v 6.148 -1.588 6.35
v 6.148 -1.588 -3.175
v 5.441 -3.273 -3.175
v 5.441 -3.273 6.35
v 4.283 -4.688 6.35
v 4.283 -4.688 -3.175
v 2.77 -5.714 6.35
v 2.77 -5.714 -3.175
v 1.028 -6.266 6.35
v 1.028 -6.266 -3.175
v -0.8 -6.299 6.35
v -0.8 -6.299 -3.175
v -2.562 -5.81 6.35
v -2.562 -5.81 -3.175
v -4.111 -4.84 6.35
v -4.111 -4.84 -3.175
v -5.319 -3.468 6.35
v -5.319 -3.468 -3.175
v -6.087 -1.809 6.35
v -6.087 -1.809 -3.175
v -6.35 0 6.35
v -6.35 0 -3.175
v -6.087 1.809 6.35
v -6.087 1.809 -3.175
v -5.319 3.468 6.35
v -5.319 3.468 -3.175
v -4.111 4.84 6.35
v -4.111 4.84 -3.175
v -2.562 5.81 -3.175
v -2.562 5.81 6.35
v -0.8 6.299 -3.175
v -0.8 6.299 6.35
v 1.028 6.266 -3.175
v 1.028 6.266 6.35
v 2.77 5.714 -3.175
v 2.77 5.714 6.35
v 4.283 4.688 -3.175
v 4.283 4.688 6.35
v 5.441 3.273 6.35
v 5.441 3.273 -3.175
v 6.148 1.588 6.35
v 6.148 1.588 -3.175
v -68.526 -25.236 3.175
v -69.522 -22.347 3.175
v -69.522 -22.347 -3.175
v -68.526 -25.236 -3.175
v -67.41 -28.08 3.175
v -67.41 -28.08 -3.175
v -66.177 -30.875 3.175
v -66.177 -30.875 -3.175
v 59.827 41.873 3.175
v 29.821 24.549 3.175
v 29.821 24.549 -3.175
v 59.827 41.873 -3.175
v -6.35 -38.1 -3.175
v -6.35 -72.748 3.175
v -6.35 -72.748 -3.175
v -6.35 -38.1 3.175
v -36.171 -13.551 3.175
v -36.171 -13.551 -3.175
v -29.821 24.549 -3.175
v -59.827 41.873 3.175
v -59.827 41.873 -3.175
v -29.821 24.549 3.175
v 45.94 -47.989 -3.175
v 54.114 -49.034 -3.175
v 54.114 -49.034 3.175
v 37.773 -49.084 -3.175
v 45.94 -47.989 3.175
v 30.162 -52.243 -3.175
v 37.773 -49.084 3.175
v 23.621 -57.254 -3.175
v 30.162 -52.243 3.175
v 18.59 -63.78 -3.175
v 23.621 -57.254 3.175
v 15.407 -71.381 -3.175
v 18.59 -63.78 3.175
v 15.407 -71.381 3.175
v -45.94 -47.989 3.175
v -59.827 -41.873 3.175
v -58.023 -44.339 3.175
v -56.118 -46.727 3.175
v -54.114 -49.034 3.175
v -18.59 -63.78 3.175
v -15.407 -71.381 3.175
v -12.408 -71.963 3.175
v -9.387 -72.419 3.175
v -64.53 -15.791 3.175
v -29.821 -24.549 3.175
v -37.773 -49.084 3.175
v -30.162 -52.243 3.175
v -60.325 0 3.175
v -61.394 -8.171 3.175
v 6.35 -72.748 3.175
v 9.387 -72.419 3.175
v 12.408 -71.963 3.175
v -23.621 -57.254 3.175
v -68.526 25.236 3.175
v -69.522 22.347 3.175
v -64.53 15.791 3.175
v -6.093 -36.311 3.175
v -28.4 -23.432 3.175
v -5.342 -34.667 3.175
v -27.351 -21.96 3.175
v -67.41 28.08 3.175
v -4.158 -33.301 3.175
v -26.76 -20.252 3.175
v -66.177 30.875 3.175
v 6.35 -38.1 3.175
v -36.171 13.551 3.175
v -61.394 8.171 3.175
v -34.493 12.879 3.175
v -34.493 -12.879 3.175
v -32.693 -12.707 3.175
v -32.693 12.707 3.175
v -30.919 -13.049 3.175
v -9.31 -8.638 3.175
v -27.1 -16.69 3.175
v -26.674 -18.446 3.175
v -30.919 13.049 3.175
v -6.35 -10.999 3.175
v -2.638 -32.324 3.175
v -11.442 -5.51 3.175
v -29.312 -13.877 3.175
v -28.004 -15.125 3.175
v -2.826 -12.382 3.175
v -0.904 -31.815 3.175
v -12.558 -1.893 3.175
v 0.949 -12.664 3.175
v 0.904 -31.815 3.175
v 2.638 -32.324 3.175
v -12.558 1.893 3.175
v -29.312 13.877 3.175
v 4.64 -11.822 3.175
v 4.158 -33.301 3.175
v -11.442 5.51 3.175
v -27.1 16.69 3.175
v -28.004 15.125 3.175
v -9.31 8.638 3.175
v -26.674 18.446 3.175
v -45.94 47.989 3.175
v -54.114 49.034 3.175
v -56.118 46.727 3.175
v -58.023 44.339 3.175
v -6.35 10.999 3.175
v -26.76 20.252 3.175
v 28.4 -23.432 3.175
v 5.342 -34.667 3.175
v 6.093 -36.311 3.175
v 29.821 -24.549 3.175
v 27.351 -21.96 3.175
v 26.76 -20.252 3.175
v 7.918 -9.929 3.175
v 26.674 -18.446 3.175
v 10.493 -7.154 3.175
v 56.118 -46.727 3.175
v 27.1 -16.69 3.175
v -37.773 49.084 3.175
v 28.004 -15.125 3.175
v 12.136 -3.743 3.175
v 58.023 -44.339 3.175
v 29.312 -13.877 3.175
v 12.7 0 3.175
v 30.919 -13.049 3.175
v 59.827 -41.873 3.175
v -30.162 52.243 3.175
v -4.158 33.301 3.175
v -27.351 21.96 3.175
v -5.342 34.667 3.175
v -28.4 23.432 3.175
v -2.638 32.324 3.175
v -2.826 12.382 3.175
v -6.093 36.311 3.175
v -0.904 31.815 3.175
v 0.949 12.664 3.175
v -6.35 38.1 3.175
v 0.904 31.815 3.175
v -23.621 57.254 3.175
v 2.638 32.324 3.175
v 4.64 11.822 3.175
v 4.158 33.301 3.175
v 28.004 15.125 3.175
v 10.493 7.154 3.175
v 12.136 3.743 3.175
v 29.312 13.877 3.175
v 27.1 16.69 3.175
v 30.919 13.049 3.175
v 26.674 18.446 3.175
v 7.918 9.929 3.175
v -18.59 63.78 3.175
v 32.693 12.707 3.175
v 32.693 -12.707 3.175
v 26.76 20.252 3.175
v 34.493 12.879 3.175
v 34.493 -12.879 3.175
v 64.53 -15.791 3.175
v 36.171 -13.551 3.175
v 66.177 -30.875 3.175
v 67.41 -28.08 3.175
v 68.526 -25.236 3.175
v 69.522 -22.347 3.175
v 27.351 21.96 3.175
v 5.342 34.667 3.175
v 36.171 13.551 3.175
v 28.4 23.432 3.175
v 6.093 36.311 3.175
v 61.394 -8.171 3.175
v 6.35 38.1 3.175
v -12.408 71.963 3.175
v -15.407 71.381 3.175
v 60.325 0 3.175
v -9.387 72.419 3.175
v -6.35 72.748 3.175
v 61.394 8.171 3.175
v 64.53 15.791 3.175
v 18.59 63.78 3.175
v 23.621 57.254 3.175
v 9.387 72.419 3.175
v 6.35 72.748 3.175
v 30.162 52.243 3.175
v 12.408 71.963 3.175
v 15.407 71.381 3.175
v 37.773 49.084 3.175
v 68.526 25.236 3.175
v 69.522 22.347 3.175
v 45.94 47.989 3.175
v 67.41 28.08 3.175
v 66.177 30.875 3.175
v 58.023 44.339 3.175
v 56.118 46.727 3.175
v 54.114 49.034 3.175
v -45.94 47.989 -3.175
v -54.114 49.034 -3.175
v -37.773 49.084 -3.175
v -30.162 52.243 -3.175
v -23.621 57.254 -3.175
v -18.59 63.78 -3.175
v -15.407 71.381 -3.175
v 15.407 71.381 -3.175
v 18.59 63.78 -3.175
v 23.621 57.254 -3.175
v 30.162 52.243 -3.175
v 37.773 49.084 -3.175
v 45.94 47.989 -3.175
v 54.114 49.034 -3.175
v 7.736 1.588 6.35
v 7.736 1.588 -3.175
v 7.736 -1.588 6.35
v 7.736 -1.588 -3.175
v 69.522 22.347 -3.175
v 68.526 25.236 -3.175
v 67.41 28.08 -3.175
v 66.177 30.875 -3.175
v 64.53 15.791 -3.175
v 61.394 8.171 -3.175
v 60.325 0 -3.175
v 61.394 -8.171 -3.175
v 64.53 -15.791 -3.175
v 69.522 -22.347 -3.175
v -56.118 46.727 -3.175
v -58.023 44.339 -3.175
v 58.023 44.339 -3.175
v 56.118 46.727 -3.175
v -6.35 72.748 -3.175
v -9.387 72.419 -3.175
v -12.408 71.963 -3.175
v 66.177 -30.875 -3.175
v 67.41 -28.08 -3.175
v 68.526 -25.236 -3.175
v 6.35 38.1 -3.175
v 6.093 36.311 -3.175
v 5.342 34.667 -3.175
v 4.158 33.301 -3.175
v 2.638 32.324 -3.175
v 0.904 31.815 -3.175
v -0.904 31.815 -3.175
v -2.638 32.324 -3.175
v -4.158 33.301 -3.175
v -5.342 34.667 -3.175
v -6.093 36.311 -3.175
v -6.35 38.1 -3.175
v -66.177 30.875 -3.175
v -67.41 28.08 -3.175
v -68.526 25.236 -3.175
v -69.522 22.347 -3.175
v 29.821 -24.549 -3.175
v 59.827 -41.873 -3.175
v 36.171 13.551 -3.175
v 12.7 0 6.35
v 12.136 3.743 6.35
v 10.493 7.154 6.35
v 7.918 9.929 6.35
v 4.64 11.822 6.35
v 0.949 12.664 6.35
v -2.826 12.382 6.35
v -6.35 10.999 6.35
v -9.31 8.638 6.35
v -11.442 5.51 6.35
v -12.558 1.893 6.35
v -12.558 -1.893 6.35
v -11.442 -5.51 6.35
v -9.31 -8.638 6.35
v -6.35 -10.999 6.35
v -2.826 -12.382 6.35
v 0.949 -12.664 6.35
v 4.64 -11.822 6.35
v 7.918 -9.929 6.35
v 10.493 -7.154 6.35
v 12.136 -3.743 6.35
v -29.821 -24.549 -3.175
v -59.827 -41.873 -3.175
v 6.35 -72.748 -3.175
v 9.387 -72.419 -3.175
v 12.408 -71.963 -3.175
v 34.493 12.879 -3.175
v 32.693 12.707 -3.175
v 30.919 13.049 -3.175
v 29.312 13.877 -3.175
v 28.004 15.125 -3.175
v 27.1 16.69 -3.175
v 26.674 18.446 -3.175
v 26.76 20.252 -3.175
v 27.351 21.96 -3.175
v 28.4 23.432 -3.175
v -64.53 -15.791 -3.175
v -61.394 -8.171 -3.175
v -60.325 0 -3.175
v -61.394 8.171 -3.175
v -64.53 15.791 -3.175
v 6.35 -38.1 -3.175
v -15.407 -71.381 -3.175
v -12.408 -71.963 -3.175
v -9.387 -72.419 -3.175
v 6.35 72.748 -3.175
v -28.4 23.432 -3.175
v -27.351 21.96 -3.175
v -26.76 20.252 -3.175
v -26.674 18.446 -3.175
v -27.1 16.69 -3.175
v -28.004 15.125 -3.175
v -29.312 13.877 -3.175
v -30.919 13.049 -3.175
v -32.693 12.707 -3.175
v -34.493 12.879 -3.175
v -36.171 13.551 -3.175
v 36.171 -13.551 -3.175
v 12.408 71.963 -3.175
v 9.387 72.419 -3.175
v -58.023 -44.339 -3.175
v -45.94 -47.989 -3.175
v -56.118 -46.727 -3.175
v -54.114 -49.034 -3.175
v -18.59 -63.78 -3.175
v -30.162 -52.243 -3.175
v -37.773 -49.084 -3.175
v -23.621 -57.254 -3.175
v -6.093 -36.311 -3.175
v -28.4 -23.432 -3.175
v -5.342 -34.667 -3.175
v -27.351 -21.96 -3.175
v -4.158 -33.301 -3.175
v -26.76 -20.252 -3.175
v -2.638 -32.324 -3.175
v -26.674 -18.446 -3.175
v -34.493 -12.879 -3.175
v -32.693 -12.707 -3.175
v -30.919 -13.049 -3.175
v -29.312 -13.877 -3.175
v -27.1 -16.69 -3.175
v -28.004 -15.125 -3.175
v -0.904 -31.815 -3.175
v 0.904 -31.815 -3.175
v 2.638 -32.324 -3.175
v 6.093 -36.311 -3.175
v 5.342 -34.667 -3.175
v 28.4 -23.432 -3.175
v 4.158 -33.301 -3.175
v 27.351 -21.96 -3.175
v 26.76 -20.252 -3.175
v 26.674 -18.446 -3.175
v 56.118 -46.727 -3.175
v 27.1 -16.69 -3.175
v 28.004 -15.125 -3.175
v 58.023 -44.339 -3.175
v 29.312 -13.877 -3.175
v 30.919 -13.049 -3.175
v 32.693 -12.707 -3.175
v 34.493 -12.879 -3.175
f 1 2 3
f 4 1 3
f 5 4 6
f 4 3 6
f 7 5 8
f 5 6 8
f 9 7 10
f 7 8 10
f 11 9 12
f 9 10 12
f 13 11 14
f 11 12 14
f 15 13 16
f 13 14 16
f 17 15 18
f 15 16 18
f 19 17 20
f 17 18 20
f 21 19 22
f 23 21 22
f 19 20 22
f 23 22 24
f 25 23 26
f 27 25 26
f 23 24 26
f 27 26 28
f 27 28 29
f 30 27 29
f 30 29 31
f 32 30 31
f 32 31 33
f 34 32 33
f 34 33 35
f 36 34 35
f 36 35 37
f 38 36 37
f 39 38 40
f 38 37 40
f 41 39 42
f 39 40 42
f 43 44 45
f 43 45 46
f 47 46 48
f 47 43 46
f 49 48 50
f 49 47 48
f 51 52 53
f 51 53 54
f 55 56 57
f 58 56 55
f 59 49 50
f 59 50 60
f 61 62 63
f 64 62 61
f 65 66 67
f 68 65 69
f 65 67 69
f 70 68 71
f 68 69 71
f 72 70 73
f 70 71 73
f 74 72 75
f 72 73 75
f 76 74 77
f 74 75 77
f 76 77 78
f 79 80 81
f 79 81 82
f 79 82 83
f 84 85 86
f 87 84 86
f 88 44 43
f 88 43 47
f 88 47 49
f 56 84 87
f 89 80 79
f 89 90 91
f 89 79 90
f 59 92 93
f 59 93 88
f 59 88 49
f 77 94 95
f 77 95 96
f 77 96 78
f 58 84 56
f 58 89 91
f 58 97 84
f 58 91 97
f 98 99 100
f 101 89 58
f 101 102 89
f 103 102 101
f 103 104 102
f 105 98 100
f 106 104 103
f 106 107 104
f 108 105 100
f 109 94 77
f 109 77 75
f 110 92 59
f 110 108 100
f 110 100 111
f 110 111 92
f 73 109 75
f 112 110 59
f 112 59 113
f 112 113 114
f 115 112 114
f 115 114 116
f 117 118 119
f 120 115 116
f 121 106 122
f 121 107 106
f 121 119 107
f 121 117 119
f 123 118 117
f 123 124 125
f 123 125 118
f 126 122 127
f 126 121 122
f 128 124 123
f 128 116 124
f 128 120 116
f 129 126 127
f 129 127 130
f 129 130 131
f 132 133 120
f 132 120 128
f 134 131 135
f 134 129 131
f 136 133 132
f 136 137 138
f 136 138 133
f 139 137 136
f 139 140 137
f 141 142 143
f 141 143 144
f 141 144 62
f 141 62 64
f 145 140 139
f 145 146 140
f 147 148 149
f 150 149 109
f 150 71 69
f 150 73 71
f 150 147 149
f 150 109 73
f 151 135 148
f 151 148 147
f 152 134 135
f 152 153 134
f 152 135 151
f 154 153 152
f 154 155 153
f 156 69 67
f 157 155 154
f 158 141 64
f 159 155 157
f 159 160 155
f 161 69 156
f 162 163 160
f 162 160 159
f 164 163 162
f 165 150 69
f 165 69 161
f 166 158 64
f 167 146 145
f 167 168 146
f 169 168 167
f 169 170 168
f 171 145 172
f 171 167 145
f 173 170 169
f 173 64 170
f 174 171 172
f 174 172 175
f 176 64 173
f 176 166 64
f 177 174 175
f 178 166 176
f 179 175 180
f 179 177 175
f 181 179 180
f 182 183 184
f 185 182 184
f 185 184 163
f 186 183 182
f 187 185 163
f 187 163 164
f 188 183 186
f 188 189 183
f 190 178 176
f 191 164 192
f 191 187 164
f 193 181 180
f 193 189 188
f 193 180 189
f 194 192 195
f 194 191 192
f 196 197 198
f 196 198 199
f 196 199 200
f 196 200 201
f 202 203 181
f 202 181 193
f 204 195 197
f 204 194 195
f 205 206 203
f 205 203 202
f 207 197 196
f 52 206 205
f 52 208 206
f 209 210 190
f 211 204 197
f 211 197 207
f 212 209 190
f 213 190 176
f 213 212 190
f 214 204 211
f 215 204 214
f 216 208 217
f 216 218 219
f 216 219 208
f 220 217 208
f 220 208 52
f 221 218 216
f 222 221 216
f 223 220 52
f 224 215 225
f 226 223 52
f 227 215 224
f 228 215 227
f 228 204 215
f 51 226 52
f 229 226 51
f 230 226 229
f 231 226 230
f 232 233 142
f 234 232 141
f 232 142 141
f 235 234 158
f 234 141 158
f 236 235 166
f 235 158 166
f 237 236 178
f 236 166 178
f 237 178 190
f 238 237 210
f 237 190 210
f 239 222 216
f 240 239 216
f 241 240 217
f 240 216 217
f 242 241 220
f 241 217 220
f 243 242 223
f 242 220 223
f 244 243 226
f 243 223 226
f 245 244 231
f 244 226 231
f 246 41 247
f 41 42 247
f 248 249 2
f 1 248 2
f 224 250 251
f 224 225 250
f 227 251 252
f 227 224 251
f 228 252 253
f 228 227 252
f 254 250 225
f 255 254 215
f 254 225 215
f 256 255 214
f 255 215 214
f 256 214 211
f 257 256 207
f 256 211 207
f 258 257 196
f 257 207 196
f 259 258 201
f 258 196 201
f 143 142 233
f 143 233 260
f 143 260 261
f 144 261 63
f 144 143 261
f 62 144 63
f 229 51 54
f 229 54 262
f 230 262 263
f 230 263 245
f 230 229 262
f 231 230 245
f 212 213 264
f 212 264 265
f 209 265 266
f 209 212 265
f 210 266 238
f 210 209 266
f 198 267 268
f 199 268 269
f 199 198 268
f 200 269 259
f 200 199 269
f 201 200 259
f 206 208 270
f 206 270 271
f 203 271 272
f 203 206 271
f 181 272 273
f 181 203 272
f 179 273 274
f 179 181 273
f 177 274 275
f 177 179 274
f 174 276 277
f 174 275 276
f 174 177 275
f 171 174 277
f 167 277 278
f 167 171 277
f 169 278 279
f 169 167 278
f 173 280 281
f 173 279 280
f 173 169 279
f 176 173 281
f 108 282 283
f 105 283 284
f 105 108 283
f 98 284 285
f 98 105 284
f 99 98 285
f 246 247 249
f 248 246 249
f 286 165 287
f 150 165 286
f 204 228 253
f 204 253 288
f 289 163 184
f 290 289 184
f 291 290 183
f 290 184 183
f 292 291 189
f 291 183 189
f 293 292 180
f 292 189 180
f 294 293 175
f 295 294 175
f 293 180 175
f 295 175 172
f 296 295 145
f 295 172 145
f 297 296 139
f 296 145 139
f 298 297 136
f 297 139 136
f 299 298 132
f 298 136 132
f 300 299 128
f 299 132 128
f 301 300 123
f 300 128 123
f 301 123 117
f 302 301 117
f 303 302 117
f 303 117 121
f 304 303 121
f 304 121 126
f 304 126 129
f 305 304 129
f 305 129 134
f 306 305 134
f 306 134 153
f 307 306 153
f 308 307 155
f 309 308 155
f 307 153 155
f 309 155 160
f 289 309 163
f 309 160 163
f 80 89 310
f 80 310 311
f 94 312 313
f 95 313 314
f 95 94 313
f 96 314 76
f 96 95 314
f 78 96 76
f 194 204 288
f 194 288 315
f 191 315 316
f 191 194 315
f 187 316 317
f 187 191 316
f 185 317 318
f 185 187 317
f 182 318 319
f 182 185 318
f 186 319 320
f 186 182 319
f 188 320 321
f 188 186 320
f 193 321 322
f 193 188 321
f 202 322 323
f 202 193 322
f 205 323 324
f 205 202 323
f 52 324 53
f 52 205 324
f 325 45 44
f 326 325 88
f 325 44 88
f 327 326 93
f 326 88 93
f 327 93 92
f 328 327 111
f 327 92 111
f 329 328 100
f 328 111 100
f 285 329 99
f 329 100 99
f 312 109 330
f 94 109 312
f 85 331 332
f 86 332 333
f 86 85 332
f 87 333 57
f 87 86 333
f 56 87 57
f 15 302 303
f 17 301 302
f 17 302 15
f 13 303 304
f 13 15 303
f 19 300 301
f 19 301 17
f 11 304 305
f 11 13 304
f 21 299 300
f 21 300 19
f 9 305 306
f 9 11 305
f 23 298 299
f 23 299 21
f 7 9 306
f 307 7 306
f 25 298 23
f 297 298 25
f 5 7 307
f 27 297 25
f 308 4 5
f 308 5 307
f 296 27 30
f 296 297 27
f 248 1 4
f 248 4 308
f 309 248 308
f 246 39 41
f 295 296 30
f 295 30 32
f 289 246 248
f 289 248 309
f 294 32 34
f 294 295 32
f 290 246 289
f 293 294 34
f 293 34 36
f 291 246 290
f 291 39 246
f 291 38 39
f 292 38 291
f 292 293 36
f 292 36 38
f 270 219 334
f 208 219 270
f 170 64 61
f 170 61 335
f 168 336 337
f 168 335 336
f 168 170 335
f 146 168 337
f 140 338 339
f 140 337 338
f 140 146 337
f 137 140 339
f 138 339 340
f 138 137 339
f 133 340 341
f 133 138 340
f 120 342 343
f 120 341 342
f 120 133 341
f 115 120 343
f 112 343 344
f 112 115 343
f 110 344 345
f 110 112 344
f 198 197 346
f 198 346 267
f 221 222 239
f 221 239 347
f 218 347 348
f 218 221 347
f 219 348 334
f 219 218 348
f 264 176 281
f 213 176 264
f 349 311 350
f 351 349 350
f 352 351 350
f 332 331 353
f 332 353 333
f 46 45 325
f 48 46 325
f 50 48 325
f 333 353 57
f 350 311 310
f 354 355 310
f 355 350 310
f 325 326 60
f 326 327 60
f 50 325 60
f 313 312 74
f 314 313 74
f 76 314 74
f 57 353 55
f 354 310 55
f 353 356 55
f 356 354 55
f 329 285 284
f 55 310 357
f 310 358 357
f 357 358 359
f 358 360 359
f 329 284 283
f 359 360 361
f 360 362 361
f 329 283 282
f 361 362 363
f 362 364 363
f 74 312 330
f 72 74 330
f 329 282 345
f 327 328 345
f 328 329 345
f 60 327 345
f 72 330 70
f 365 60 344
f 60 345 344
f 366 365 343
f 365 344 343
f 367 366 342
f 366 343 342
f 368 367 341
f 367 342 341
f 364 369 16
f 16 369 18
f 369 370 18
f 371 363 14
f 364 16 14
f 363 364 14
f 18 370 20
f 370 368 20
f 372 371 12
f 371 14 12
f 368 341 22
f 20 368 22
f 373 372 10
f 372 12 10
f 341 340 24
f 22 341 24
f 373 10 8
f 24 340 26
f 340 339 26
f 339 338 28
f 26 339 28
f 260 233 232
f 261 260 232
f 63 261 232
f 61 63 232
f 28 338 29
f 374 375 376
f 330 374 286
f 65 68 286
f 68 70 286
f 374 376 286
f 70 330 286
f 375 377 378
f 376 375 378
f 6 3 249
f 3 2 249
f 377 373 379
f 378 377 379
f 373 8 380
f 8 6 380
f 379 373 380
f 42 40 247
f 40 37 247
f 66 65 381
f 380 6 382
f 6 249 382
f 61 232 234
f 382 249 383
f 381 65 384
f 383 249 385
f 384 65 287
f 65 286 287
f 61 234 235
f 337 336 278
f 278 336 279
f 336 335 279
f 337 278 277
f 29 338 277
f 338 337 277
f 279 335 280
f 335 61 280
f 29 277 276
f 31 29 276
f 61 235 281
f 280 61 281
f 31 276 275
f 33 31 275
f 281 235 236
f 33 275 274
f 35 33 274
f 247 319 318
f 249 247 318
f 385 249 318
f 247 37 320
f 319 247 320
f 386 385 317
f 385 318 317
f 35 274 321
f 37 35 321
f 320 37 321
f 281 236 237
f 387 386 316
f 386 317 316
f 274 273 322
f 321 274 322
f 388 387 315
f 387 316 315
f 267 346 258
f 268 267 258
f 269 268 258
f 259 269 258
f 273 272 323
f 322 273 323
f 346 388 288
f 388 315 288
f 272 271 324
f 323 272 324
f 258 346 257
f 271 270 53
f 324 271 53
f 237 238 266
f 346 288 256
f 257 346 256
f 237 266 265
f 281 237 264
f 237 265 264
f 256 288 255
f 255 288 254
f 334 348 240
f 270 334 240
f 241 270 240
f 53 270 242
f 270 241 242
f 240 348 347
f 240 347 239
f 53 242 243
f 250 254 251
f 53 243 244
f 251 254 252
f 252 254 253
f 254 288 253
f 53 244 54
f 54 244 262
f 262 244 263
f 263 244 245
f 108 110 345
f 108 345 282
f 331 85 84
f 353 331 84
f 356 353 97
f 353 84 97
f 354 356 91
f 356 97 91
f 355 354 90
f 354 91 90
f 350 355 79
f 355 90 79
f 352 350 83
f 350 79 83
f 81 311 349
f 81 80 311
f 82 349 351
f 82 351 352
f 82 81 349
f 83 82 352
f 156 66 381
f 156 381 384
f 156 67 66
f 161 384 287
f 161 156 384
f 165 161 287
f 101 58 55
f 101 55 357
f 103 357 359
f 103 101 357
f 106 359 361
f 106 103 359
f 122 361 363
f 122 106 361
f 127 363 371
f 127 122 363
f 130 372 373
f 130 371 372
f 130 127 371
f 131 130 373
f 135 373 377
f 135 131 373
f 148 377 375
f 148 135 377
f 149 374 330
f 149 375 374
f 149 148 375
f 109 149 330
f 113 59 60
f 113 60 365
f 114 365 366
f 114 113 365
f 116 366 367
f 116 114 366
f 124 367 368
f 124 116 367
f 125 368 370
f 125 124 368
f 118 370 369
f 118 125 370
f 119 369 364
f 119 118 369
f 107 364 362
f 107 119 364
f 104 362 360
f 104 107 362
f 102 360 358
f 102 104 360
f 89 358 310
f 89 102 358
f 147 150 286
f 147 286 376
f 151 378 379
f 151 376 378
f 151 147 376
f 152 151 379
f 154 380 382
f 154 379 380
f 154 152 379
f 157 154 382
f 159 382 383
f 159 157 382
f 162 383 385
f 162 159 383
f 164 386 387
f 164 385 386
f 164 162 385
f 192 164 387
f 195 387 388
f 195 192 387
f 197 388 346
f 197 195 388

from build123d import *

# Parameters (mm, degrees)
SKETCH3_R           = 73.025
BOSS_EXTRUDE2_DEPTH = 3.175
SKETCH5_R           = 31.75
CUT_EXTRUDE3_DEPTH  = 104.467984179
CUT_EXTRUDE4_DEPTH  = 101.826071922
BOSS_EXTRUDE4_START = 3.175
SKETCH7_3_R         = 12.7
BOSS_EXTRUDE4_DEPTH = 3.175


with BuildPart() as part:
    # Sketch3 → Boss-Extrude2 (new, symmetric)
    with BuildSketch(Plane.XY):
        Circle(SKETCH3_R)
    extrude(amount=BOSS_EXTRUDE2_DEPTH, both=True)

    # Sketch5 → Cut-Extrude3 (cut, through all)
    with BuildSketch(Plane.XY.offset(3.175)):
        with Locations((92.075, 0)):
            Circle(SKETCH5_R)
        with Locations((46.0375, -79.739289053)):
            Circle(SKETCH5_R)
        with Locations((-46.0375, -79.739289053)):
            Circle(SKETCH5_R)
        with Locations((-92.075, 0)):
            Circle(SKETCH5_R)
        with Locations((-46.0375, 79.739289053)):
            Circle(SKETCH5_R)
        with Locations((46.0375, 79.739289053)):
            Circle(SKETCH5_R)
        with BuildLine():
            Line((66.176953095, 30.874933265), (36.170567884, 13.550738686))
            ThreePointArc((36.170567884, 13.550738686), (27.49630657, 15.875), (29.820567884, 24.549261314))
            Line((29.820567884, 24.549261314), (59.826953095, 41.873455893))
            ThreePointArc((59.826953095, 41.873455893), (68.501214409, 39.549194579), (66.176953095, 30.874933265))
        make_face()
        with BuildLine():
            Line((59.826953095, -41.873455893), (29.820567884, -24.549261314))
            ThreePointArc((29.820567884, -24.549261314), (27.49630657, -15.875), (36.170567884, -13.550738686))
            Line((36.170567884, -13.550738686), (66.176953095, -30.874933265))
            ThreePointArc((66.176953095, -30.874933265), (68.501214409, -39.549194579), (59.826953095, -41.873455893))
        make_face()
        with BuildLine():
            Line((-6.35, -72.748389157), (-6.35, -38.1))
            ThreePointArc((-6.35, -38.1), (0, -31.75), (6.35, -38.1))
            Line((6.35, -38.1), (6.35, -72.748389157))
            ThreePointArc((6.35, -72.748389157), (0, -79.098389157), (-6.35, -72.748389157))
        make_face()
        with BuildLine():
            Line((-66.176953095, -30.874933265), (-36.170567884, -13.550738686))
            ThreePointArc((-36.170567884, -13.550738686), (-27.49630657, -15.875), (-29.820567884, -24.549261314))
            Line((-29.820567884, -24.549261314), (-59.826953095, -41.873455893))
            ThreePointArc((-59.826953095, -41.873455893), (-68.501214409, -39.549194579), (-66.176953095, -30.874933265))
        make_face()
        with BuildLine():
            Line((-59.826953095, 41.873455893), (-29.820567884, 24.549261314))
            ThreePointArc((-29.820567884, 24.549261314), (-27.49630657, 15.875), (-36.170567884, 13.550738686))
            Line((-36.170567884, 13.550738686), (-66.176953095, 30.874933265))
            ThreePointArc((-66.176953095, 30.874933265), (-68.501214409, 39.549194579), (-59.826953095, 41.873455893))
        make_face()
        with BuildLine():
            Line((6.35, 72.748389157), (6.35, 38.1))
            ThreePointArc((6.35, 38.1), (0, 31.75), (-6.35, 38.1))
            Line((-6.35, 38.1), (-6.35, 72.748389157))
            ThreePointArc((-6.35, 72.748389157), (0, 79.098389157), (6.35, 72.748389157))
        make_face()
    extrude(amount=-CUT_EXTRUDE3_DEPTH, mode=Mode.SUBTRACT)

    # Sketch7 → Cut-Extrude4 (cut, through all)
    with BuildSketch(Plane.XY.offset(3.175)):
        with BuildLine():
            Line((6.148361062, 1.5875), (7.735861062, 1.5875))
            Line((7.735861062, 1.5875), (7.735861062, -1.5875))
            Line((7.735861062, -1.5875), (6.148361062, -1.5875))
            ThreePointArc((6.148361062, -1.5875), (-6.35, 0), (6.148361062, 1.5875))
        make_face()
    extrude(amount=-CUT_EXTRUDE4_DEPTH, mode=Mode.SUBTRACT)

    # Sketch7<3> → Boss-Extrude4 (add)
    with BuildSketch(Plane.XY.offset(3.175).offset(BOSS_EXTRUDE4_START)):
        Circle(SKETCH7_3_R)
        with BuildLine():
            Line((6.148361062, 1.5875), (7.735861062, 1.5875))
            Line((7.735861062, 1.5875), (7.735861062, -1.5875))
            Line((7.735861062, -1.5875), (6.148361062, -1.5875))
            ThreePointArc((6.148361062, -1.5875), (-6.35, 0), (6.148361062, 1.5875))
        make_face(mode=Mode.SUBTRACT)
    extrude(amount=-BOSS_EXTRUDE4_DEPTH)


solid = part.part
